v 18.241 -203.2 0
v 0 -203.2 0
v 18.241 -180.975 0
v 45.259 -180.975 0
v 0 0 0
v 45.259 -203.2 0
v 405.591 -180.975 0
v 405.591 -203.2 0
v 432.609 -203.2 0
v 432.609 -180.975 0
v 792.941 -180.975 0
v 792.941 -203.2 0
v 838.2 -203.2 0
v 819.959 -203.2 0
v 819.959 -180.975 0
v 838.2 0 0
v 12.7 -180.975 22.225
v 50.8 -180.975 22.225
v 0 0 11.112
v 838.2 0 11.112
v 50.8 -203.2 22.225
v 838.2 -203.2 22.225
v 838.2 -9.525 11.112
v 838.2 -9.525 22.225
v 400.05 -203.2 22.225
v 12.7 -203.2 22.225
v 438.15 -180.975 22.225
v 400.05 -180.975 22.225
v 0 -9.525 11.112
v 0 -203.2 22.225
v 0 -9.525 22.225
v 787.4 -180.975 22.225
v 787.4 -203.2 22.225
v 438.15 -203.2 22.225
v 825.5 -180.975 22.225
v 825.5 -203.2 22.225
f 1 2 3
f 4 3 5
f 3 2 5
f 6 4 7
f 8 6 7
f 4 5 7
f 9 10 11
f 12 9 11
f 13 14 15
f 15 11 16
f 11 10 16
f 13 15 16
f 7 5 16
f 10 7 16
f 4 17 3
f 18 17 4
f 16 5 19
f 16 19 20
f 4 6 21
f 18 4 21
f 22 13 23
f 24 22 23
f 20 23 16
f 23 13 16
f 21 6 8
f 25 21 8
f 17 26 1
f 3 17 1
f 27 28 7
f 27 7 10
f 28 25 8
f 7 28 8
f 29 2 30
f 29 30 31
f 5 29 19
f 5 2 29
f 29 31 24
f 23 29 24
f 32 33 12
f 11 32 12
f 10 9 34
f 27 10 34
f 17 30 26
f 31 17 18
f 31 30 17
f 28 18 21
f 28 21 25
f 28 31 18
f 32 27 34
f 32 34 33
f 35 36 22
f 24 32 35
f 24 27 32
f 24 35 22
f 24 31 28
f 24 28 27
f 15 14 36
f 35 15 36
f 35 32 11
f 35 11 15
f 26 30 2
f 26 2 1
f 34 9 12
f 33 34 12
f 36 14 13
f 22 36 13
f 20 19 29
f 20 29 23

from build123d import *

# Parameters (mm, degrees)
F0_W     = 838.2
F0_H     = 203.2
F1_DEPTH = 22.225
F2_W     = 838.2
F2_H     = 9.525
F3_DEPTH = 11.1125
F5_DEPTH = 22.225


# Not quite as in the source:
# - a feature names something its author has since deleted; it is built from what else it names


with BuildPart() as f1:
    # F0 (on Top) → F1 (new body)
    with BuildSketch(Plane.XY):
        with Locations((419.1, -101.6)):
            Rectangle(F0_W, F0_H)
    extrude(amount=F1_DEPTH)

    # F2 (on face) → F3 (cut)
    with BuildSketch(Plane.XY.offset(22.225)):
        with Locations((419.1, -4.7625)):
            Rectangle(F2_W, F2_H)
    extrude(amount=-F3_DEPTH, mode=Mode.SUBTRACT)

    # F4 (on face) → F5 (cut)
    with BuildSketch(Plane.XZ.offset(203.2)):
        Polygon((438.15, 22.225), (400.05, 22.225), (405.5913148632, 0), (432.6086851368, 0), align=None)
        Polygon((45.2586851368, 0), (50.8, 22.225), (12.7, 22.225), (18.2413148632, 0), align=None)
        Polygon((825.5, 22.225), (787.4, 22.225), (792.9413148632, 0), (819.9586851368, 0), align=None)
    extrude(amount=-F5_DEPTH, mode=Mode.SUBTRACT)


solid = f1.part
